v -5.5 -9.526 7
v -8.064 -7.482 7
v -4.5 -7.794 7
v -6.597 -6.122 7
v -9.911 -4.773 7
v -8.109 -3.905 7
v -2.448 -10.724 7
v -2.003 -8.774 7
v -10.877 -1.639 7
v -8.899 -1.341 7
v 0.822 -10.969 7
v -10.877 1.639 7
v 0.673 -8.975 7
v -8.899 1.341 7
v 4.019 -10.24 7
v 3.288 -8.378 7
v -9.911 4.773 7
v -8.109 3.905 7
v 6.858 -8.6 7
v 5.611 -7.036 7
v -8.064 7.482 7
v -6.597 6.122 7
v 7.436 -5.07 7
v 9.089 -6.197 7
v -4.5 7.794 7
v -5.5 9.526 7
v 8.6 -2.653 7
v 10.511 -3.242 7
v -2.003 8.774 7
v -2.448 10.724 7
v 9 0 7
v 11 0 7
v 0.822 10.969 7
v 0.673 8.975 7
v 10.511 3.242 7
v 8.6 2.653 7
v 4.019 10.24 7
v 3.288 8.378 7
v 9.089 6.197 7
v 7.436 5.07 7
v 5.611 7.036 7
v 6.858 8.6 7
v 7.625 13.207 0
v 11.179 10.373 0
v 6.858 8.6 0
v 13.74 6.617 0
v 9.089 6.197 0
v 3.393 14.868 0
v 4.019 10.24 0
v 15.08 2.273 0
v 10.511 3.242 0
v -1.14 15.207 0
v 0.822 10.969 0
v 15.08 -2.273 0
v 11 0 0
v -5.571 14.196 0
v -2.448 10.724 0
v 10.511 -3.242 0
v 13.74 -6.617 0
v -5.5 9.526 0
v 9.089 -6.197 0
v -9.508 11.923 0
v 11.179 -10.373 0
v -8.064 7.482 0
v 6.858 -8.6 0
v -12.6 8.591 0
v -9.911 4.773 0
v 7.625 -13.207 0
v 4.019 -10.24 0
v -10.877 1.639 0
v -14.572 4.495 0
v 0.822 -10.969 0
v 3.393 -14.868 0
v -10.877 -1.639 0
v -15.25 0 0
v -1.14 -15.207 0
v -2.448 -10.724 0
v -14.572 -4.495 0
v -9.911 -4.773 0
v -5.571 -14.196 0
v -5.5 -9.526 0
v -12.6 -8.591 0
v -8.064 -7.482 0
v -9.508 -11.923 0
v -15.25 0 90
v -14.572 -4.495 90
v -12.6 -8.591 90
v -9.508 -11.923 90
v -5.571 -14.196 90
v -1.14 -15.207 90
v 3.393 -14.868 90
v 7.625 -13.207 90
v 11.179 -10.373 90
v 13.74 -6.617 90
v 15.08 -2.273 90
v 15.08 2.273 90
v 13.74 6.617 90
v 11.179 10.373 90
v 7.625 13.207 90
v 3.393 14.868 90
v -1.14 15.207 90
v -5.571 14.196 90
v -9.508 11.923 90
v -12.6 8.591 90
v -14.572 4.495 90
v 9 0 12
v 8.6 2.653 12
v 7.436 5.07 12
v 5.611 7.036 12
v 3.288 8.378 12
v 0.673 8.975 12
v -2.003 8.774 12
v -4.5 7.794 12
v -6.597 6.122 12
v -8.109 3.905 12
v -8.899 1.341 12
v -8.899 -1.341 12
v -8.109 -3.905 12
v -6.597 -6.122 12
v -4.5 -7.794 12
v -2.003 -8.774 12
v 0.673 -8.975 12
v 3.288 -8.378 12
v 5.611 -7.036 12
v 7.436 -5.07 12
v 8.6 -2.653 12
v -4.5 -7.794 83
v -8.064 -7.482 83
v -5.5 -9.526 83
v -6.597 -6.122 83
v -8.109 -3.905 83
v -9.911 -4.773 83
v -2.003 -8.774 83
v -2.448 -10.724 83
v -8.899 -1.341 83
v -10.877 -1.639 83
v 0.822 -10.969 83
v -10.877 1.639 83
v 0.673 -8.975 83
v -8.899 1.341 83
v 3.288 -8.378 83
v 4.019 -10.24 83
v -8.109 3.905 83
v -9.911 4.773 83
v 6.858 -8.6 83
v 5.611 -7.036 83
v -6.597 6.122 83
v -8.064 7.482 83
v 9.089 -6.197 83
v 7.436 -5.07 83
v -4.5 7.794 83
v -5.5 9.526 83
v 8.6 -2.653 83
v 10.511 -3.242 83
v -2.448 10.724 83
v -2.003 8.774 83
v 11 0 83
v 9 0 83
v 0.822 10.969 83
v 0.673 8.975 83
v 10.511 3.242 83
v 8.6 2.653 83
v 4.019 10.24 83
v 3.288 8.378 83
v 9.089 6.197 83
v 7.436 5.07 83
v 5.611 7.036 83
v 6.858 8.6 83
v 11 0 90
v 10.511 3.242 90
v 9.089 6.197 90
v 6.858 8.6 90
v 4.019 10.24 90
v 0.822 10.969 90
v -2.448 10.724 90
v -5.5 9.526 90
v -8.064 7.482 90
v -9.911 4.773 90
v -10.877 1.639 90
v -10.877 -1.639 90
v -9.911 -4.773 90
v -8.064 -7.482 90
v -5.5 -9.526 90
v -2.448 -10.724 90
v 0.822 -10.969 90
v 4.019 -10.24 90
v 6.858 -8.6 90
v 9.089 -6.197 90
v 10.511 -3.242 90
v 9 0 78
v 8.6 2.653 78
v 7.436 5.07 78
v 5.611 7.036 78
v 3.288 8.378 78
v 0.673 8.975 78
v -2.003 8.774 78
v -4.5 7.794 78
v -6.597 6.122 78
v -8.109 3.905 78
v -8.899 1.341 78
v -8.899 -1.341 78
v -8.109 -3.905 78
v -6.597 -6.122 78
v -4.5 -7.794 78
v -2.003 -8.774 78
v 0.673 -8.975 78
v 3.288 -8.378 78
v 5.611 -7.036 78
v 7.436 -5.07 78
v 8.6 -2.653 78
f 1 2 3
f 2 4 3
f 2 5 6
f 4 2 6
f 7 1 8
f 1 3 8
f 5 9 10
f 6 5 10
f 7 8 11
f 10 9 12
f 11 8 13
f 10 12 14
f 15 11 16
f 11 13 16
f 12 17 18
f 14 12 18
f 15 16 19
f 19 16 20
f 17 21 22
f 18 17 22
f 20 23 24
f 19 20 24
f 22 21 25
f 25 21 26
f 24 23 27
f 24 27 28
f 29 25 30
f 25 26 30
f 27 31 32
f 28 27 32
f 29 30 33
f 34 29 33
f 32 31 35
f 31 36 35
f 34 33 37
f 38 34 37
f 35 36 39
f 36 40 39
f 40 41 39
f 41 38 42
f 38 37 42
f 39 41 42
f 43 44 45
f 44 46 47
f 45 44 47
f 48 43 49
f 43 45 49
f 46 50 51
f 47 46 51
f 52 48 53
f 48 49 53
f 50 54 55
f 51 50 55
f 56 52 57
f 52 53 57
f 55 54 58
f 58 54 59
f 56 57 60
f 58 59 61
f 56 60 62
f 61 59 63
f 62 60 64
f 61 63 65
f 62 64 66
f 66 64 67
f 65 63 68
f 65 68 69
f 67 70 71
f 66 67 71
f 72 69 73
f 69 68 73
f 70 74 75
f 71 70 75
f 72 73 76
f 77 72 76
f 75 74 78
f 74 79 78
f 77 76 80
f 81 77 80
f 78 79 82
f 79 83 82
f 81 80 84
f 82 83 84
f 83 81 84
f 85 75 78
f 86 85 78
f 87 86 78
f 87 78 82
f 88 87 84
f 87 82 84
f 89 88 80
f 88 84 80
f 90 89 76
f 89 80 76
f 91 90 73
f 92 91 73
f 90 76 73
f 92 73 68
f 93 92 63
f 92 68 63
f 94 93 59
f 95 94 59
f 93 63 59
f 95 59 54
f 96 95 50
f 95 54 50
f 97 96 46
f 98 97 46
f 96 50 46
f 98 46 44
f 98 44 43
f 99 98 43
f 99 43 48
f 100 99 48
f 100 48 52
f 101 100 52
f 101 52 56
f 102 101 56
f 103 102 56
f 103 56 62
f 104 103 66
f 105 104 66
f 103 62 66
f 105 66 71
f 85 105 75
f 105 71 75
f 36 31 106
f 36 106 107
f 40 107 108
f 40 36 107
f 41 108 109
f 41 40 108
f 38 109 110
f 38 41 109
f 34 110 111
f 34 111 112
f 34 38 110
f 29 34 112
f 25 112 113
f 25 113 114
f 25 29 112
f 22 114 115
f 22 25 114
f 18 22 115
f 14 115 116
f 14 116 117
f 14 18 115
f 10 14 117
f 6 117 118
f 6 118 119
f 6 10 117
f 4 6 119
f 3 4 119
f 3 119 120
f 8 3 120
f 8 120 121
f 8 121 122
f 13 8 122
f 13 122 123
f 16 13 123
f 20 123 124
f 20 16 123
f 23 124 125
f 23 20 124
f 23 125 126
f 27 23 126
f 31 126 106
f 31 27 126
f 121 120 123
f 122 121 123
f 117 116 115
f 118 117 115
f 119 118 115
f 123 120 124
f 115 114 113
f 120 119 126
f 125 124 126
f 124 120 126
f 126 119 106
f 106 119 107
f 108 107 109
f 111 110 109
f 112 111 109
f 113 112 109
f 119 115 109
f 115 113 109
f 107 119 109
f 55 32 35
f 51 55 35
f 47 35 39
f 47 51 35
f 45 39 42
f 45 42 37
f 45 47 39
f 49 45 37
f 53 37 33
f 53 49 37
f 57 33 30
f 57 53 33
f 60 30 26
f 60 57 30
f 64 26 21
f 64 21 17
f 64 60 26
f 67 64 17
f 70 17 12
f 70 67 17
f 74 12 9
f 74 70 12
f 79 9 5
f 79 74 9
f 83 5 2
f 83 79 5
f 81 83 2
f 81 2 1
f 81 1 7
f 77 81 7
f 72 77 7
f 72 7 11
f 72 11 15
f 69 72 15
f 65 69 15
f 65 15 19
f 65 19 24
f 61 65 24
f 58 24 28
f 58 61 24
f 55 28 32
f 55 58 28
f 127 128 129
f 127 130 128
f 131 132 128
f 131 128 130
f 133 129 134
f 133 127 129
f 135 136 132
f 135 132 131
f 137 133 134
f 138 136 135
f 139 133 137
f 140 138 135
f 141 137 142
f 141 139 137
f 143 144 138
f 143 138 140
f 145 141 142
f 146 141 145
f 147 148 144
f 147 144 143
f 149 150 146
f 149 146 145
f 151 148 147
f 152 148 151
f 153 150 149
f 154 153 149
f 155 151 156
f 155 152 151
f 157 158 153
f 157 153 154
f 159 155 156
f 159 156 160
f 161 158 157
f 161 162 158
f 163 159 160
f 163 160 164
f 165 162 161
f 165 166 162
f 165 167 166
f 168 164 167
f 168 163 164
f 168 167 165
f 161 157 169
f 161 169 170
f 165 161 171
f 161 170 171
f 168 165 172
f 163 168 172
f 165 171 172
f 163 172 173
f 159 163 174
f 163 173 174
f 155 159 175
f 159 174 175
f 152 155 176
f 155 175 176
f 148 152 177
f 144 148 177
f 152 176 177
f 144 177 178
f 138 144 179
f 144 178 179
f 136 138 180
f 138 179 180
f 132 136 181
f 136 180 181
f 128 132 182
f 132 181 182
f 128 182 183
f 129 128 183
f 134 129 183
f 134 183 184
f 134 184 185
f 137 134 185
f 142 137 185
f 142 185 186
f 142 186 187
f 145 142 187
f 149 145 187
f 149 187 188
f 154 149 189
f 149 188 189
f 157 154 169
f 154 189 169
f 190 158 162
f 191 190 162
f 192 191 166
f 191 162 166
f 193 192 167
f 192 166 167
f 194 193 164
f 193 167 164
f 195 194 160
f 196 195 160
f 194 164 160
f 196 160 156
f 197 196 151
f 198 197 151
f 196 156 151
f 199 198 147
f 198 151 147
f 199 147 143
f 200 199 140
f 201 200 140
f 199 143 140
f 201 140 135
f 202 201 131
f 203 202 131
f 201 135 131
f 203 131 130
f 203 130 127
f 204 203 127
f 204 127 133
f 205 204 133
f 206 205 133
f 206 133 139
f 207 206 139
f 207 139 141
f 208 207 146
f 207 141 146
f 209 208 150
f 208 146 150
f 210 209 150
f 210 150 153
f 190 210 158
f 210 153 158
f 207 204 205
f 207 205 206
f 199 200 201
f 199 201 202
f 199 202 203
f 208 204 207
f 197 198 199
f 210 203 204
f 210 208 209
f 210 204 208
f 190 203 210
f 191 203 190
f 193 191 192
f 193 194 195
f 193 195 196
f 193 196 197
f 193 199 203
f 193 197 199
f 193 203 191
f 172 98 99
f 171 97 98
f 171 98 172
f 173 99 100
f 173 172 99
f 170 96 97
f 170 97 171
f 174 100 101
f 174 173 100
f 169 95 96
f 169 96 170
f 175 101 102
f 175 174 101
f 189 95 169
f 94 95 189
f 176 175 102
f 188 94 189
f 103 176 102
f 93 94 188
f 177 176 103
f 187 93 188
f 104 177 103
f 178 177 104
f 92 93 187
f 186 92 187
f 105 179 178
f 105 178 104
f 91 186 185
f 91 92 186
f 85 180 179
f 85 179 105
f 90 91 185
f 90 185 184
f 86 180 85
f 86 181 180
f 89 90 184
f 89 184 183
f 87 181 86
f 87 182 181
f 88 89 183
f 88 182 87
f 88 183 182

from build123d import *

# Parameters (mm, degrees)
ESQUISSE1_R             = 15.25
BOSS_EXTRU_1_DEPTH      = 90
ESQUISSE2_R             = 11
ENL_V_MAT_EXTRU_1_DEPTH = 7
ESQUISSE3_R             = 9
ENL_V_MAT_EXTRU_2_DEPTH = 5


with BuildPart() as part:
    # Esquisse1 → Boss.-Extru.1 (new body)
    with BuildSketch(Plane.XY):
        with Locations(Location((0, 0, 0), (0, 0, 180))):
            Circle(ESQUISSE1_R)
    extrude(amount=BOSS_EXTRU_1_DEPTH)

    # Esquisse2 → Enlèv. mat.-Extru.1 (cut)
    with BuildSketch(Plane.XY.offset(90)):
        Circle(ESQUISSE2_R)
    enl_v_mat_extru_1 = extrude(amount=-ENL_V_MAT_EXTRU_1_DEPTH, mode=Mode.SUBTRACT)

    # Esquisse3 → Enlèv. mat.-Extru.2 (cut)
    with BuildSketch(Plane.XY.offset(83)):
        Circle(ESQUISSE3_R)
    enl_v_mat_extru_2 = extrude(amount=-ENL_V_MAT_EXTRU_2_DEPTH, mode=Mode.SUBTRACT)

    # Symétrie1: Enlèv. mat.-Extru.1, Enlèv. mat.-Extru.2 across plane
    add(enl_v_mat_extru_1.mirror(Plane.XY.offset(45)), mode=Mode.SUBTRACT)
    add(enl_v_mat_extru_2.mirror(Plane.XY.offset(45)), mode=Mode.SUBTRACT)


solid = part.part
